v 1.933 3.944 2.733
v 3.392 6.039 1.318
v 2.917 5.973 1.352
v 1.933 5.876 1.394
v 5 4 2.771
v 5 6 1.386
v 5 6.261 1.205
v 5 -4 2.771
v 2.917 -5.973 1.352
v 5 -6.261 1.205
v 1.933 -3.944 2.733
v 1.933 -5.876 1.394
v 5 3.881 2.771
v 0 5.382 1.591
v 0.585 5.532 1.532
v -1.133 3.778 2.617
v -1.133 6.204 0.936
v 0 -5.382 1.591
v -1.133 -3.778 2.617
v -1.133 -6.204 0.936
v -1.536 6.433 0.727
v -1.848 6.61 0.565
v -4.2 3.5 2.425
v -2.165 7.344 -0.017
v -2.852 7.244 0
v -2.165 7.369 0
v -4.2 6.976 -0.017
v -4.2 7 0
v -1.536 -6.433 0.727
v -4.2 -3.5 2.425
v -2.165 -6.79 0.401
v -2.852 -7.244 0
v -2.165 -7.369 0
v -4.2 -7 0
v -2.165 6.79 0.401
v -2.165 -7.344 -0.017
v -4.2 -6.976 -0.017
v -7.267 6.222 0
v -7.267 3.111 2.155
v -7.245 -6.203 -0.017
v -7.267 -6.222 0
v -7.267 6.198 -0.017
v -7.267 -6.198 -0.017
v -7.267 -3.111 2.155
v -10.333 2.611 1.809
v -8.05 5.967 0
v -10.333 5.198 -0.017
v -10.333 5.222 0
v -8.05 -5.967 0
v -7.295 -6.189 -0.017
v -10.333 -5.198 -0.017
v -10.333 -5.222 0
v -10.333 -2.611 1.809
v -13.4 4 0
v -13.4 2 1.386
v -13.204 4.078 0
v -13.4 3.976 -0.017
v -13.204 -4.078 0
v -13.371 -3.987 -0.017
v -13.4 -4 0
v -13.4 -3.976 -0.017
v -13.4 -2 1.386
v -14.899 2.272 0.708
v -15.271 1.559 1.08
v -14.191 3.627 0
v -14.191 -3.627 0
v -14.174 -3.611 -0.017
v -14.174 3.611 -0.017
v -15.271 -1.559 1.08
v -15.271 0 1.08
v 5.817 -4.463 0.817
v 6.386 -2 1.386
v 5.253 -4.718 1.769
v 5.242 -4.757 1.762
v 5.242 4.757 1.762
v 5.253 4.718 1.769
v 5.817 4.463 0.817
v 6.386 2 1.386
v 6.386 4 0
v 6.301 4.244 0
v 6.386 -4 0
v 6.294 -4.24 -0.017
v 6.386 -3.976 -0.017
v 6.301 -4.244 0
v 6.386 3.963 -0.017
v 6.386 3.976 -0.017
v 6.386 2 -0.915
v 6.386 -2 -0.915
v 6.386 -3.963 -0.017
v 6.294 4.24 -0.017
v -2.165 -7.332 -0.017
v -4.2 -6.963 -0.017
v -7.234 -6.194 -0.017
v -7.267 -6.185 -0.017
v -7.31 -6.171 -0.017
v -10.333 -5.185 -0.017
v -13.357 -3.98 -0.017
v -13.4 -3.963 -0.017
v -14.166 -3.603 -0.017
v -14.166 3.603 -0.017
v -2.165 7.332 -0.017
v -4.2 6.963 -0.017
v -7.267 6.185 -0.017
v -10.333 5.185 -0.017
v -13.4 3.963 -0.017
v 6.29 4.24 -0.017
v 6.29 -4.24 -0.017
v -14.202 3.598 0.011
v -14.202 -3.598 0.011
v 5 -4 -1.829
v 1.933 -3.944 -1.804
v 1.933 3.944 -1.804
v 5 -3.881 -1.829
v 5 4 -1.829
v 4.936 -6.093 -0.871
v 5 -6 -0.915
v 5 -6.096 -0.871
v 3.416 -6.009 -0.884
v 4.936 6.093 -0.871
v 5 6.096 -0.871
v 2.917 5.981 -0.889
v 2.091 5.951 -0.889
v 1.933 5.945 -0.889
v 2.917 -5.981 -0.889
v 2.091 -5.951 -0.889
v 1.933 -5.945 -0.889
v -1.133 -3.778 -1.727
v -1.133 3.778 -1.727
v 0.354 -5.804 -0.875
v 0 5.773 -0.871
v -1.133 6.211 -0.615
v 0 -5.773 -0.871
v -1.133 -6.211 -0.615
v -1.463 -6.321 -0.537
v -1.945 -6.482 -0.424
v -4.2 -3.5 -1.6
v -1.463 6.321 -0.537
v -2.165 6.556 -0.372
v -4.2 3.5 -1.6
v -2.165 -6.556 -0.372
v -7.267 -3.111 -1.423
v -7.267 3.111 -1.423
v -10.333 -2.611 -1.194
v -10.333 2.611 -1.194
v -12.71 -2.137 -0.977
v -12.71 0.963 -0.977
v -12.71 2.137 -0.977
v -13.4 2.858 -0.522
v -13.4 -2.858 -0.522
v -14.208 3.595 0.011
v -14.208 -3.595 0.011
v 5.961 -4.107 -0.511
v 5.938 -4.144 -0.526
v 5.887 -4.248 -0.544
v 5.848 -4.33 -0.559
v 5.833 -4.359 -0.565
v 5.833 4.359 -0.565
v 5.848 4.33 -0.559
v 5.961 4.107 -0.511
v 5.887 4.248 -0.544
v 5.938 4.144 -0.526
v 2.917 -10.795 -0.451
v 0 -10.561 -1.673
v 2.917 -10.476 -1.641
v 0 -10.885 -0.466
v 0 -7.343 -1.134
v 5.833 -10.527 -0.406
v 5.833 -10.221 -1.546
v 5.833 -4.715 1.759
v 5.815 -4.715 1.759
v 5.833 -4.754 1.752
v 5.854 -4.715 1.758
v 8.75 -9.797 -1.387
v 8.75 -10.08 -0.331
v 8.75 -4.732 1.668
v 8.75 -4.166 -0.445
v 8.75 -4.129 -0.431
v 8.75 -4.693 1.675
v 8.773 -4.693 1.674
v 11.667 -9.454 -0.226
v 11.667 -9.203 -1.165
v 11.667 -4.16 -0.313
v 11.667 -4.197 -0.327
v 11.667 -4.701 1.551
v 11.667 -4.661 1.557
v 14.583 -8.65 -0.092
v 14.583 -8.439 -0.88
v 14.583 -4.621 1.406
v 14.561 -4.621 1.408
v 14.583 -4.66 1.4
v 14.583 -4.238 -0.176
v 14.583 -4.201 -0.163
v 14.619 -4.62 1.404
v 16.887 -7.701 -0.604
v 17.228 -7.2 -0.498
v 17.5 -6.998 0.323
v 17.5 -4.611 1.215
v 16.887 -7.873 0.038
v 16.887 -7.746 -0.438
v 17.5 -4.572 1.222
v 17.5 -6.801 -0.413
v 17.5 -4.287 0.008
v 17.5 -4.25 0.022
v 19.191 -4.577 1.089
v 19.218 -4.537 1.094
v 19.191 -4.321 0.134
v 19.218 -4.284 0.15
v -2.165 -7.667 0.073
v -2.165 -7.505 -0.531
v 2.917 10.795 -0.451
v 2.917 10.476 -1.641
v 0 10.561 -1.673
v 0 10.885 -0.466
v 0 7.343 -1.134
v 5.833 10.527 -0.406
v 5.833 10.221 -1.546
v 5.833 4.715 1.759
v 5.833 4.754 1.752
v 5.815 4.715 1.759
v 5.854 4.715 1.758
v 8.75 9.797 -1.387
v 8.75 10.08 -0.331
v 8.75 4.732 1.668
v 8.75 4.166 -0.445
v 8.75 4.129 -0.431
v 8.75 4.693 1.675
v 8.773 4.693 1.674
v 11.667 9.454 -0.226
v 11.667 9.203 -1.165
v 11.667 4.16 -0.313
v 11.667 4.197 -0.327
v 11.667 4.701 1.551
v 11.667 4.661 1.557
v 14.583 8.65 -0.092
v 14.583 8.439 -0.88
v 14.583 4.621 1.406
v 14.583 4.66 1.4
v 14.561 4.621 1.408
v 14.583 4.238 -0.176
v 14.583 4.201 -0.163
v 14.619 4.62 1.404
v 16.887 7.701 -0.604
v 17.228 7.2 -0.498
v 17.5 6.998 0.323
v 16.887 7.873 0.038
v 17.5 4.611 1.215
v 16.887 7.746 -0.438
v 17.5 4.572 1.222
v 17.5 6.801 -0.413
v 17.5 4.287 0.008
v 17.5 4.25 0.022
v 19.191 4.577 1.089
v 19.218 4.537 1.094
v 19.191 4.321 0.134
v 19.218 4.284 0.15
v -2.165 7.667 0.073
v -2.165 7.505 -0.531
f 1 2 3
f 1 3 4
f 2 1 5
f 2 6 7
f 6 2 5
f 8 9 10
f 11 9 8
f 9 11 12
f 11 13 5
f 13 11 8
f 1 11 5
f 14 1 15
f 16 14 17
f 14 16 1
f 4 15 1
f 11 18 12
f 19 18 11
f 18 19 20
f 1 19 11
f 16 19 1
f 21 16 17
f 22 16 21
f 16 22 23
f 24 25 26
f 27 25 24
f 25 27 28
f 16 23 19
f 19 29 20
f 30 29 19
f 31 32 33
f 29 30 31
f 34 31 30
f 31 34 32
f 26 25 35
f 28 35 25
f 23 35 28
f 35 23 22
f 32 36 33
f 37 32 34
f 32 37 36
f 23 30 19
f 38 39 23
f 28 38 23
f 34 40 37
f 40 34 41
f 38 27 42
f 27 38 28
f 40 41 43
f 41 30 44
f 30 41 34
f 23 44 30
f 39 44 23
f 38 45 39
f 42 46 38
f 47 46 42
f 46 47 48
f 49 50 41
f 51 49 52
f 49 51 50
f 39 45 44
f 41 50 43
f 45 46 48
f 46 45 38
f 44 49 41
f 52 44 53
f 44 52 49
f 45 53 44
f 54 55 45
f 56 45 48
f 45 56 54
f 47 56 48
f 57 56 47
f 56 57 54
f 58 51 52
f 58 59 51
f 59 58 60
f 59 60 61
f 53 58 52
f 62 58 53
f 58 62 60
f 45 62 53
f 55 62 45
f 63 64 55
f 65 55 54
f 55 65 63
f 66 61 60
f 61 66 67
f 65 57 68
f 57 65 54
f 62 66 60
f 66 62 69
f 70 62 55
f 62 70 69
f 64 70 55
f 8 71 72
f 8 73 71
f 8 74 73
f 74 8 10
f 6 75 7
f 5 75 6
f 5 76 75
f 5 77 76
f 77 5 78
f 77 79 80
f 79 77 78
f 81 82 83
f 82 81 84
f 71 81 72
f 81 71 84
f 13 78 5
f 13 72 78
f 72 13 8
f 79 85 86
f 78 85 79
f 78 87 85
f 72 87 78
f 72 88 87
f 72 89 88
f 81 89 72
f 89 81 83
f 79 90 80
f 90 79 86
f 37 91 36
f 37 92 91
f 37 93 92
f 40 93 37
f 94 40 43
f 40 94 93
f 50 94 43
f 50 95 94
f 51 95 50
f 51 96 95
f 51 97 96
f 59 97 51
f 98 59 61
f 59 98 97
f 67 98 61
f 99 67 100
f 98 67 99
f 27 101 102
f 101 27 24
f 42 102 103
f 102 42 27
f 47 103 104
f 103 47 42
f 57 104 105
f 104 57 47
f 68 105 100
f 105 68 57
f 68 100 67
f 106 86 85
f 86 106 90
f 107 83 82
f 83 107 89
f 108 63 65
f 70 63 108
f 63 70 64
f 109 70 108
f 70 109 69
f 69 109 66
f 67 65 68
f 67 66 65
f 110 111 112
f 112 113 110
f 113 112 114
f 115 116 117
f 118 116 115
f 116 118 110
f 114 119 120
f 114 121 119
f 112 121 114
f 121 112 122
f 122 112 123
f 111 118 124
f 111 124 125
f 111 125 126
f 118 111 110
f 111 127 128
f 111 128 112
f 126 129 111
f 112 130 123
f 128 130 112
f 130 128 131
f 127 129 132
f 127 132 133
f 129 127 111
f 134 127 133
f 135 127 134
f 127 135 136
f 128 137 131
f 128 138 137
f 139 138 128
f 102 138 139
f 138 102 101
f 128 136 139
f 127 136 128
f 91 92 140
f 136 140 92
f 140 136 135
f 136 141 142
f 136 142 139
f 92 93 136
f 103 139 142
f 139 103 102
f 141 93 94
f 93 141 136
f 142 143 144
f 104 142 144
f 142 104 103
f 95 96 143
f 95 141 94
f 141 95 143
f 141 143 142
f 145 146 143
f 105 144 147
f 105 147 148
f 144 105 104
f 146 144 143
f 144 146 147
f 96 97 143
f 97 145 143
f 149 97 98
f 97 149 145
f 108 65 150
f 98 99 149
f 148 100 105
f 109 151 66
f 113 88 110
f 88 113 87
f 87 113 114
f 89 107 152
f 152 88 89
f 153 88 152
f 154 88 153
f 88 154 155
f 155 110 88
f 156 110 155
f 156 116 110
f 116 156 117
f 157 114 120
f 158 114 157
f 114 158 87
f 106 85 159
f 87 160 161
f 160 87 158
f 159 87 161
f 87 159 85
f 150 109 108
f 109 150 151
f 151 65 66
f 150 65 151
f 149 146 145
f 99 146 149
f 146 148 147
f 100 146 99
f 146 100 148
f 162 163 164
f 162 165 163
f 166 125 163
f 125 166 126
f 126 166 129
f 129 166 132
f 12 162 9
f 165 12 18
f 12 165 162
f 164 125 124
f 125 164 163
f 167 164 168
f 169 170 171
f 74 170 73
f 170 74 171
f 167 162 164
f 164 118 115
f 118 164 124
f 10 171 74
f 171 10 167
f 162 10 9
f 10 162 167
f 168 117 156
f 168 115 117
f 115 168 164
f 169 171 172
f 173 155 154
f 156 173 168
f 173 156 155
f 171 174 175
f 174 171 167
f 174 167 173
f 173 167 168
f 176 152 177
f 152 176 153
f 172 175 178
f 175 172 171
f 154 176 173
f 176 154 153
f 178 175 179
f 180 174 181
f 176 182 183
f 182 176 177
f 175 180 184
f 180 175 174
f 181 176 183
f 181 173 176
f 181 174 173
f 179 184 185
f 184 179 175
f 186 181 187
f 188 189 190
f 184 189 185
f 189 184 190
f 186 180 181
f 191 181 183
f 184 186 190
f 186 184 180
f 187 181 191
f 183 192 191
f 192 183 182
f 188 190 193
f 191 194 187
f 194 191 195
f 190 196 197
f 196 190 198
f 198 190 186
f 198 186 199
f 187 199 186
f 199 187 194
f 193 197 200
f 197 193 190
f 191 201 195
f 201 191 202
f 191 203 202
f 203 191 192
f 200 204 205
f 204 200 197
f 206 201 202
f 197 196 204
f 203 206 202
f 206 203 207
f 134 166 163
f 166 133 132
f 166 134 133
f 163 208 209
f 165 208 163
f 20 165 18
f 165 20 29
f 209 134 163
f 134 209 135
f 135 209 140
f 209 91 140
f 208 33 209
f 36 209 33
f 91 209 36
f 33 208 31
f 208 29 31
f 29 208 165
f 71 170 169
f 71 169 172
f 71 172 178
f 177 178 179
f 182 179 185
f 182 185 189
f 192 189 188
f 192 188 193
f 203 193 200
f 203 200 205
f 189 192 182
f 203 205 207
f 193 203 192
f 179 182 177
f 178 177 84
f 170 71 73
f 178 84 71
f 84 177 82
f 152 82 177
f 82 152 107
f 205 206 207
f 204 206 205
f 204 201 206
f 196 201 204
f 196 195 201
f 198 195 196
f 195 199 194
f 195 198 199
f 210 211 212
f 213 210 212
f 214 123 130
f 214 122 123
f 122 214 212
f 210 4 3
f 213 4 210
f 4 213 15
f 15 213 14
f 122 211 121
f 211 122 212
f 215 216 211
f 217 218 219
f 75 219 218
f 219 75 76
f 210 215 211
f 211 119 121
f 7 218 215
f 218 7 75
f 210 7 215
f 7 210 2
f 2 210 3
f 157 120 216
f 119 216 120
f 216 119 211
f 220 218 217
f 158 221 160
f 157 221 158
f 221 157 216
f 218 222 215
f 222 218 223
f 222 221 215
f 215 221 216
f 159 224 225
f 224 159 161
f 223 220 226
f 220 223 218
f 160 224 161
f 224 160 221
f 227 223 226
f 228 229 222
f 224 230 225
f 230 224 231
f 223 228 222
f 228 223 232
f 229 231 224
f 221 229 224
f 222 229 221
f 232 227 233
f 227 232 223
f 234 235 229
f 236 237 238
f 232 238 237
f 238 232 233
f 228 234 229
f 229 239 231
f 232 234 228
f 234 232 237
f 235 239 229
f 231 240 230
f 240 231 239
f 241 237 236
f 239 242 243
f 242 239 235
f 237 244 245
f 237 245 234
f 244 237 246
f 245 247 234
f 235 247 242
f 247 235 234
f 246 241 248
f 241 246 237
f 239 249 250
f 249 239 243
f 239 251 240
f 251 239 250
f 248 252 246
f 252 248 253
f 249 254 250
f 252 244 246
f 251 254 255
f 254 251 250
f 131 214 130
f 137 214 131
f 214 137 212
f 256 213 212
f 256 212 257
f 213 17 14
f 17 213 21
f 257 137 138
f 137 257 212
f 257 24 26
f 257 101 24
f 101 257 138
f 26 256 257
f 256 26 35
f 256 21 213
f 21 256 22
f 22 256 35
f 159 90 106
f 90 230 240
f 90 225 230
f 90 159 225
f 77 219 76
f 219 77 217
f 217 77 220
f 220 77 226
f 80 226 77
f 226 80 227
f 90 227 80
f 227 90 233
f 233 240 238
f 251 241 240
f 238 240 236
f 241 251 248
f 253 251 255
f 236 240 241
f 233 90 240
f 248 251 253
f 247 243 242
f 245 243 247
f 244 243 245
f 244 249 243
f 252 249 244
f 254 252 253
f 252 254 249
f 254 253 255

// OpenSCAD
// file: util.scad
fn1 = 32;
fn2 = 16;

module util_half_sphere(radius, fn=fn1) {
    difference() {
        sphere(radius, $fn=fn);
        translate([0,0,-(radius+radius/19)])
            cube(2*radius+radius/10, center=true);
    }
}

function gcd(a,b) = a == b ? a : a > b ? gcd(a-b, b) : gcd(a, b-a);

module util_saucer(length, width, height, fn=fn1) {
    rad = gcd(length,gcd(width,height));
    //rad = 10;
    scale([length/(2*rad), width/(2*rad), height/rad])
        util_half_sphere(rad, fn);
}

module util_half_cylinder(length, radius, inner_fn=fn2, outer_fn=fn1) {
    maxval = max(length, 2*radius);
    intersection() {
        difference() {
            rotate([0,90,0])
                translate([0,0,-(length/2 + length/20)])
                    cylinder(length+length/10, radius, radius, $fn=inner_fn);
            
            translate([0,0,(maxval/2 + maxval/19)])
                cube(maxval+maxval/10, center=true);
        }
        
        translate([0,0,-(radius+radius/20)])
            cylinder(radius + radius/10, length/2, length/2, $fn=outer_fn);
    }
}

module util_body(length, width, height, upper_height, fn=fn1) {
    rad = gcd(length, gcd(width, upper_height));
    
    scale(.995) scale([length/(2*rad), width/(2*rad), 1])
        util_half_cylinder(2*rad, height, outer_fn=fn);
}

module util_graded_cylinder(height, radius_start, radius_end, grades=1, fn=fn1) {
    height_grade = height / grades;
    radius_grade = (radius_start - radius_end) / (grades * grades);
    for (i = [0 : 1 : grades]) {
        translate([0,0,i*height_grade])
            cylinder(height_grade, 
                     radius_start - i*radius_grade * i,
                     radius_start - (i+1) * radius_grade * (i+1),
                     $fn = fn);
    }
}

module util_nacelle(length, width, height, curved=false, up=true, front_bulge=false) {
    rad = min(width, height/2);
    grads = curved ? 6 : 1;
    scale_factor = front_bulge ? 1.1 : 1;
    direction = up ? -1 : 1;
    difference() {
        scale([1, width/ (2*rad), height/rad])
            difference() {
                union() {
                    rotate([0,-90,0])
                        rotate(30)
                            util_graded_cylinder(length-rad, rad, rad/2, grads, 6);
                    scale(scale_factor) 
                        rotate([0,90,0]) rotate(90) sphere(rad, $fn=6);
                }
                
                translate([-length/2, 0, direction * (height/2 + height/19)])
                    cube([length+length, width+width, height+height/10], center=true);
            }
        
        translate([-length-(curved?length/3:0), 0, -length/3])
            rotate([0,-45,0])
                cube(length, center=true);
    }
}

module util_mirrored(v) {
    children();
    mirror(v) children();
}

module util_ring(outer, inner, height) {
    difference() {
        translate([0,0,-height/2])
            cylinder(height, outer, outer);
        translate([0,0,-(height/2 + height/19)])
            cylinder(height+height/10, inner, inner);
    }
}

module util_star(radius, thick, num, half=false) {
    angle = 360/num;
    offset = half? angle/2 : 0;
    for (i = [0: 1: num]) {
        rotate(i* angle + offset)
            translate([radius/2,0,0])
                cube([radius, thick, thick], center=true);
    }
}

module util_ring_star(radius, thick, num, inner, half=false) {
    outer=inner+thick;
    avg = (inner + outer)/2;
    union() {
        difference() {
            util_star(radius, thick, num, half);
            cylinder(2*thick, outer, outer, $fn=num, center=true);
        }
        util_ring(outer, inner, thick);
    }
}

module util_hangar_disk(height, lower, upper, num, fn=fn1) {
    difference() {
            cylinder(height, lower, upper, $fn=fn, center=true);
        difference() {
            scale([1,1,22])
                util_star(1.1*upper, height/20, num, half=true);
            scale(.95)
                cylinder(height, lower, upper, $fn=fn, center=true);
        }
    }
}

module util_hangar_form(length, width, height, num, inner=0) {
    l = 0.6* max(length, width);
    h = 2.5* height;
    thick = min(height/20,1);
    inner = inner == 0 ? l/3 : inner;
    difference() {
        children();
        scale([1,1,h/thick]) 
            util_ring_star(l, thick, num, inner, half=true);
    }
    scale(.95) children();
}

module util_nacelle_bar(span, height, width, thickness) {
    rad = (span*span/(8*height) + height/2);
    outer = rad + thickness/2;
    inner = rad - thickness/2;
    difference(){
        translate([0,0,outer])
            rotate([0,90,0])
                util_ring(outer, inner, width);
    
        translate([0,0,1.1*outer+height])
            cube(2.2*outer, center=true);
    }
}
// main file
use <util.scad>;

module corvette() {
    difference() {
        translate([5,0,0]) {
            util_nacelle(20,16,3.2,curved=true);
            scale([1,1,.66])
                util_nacelle(20,16,3.2,curved=true,up=false);
        }


    }

    util_mirrored([0,1,0])
        translate([0,-3,1])
            rotate([-75,0,0])
                rotate(180)
                    translate([0,0,-1.5])
                        scale([.5,.5,.75])
                            util_nacelle(40,5,10,curved=true,up=false);
    

}


corvette();
